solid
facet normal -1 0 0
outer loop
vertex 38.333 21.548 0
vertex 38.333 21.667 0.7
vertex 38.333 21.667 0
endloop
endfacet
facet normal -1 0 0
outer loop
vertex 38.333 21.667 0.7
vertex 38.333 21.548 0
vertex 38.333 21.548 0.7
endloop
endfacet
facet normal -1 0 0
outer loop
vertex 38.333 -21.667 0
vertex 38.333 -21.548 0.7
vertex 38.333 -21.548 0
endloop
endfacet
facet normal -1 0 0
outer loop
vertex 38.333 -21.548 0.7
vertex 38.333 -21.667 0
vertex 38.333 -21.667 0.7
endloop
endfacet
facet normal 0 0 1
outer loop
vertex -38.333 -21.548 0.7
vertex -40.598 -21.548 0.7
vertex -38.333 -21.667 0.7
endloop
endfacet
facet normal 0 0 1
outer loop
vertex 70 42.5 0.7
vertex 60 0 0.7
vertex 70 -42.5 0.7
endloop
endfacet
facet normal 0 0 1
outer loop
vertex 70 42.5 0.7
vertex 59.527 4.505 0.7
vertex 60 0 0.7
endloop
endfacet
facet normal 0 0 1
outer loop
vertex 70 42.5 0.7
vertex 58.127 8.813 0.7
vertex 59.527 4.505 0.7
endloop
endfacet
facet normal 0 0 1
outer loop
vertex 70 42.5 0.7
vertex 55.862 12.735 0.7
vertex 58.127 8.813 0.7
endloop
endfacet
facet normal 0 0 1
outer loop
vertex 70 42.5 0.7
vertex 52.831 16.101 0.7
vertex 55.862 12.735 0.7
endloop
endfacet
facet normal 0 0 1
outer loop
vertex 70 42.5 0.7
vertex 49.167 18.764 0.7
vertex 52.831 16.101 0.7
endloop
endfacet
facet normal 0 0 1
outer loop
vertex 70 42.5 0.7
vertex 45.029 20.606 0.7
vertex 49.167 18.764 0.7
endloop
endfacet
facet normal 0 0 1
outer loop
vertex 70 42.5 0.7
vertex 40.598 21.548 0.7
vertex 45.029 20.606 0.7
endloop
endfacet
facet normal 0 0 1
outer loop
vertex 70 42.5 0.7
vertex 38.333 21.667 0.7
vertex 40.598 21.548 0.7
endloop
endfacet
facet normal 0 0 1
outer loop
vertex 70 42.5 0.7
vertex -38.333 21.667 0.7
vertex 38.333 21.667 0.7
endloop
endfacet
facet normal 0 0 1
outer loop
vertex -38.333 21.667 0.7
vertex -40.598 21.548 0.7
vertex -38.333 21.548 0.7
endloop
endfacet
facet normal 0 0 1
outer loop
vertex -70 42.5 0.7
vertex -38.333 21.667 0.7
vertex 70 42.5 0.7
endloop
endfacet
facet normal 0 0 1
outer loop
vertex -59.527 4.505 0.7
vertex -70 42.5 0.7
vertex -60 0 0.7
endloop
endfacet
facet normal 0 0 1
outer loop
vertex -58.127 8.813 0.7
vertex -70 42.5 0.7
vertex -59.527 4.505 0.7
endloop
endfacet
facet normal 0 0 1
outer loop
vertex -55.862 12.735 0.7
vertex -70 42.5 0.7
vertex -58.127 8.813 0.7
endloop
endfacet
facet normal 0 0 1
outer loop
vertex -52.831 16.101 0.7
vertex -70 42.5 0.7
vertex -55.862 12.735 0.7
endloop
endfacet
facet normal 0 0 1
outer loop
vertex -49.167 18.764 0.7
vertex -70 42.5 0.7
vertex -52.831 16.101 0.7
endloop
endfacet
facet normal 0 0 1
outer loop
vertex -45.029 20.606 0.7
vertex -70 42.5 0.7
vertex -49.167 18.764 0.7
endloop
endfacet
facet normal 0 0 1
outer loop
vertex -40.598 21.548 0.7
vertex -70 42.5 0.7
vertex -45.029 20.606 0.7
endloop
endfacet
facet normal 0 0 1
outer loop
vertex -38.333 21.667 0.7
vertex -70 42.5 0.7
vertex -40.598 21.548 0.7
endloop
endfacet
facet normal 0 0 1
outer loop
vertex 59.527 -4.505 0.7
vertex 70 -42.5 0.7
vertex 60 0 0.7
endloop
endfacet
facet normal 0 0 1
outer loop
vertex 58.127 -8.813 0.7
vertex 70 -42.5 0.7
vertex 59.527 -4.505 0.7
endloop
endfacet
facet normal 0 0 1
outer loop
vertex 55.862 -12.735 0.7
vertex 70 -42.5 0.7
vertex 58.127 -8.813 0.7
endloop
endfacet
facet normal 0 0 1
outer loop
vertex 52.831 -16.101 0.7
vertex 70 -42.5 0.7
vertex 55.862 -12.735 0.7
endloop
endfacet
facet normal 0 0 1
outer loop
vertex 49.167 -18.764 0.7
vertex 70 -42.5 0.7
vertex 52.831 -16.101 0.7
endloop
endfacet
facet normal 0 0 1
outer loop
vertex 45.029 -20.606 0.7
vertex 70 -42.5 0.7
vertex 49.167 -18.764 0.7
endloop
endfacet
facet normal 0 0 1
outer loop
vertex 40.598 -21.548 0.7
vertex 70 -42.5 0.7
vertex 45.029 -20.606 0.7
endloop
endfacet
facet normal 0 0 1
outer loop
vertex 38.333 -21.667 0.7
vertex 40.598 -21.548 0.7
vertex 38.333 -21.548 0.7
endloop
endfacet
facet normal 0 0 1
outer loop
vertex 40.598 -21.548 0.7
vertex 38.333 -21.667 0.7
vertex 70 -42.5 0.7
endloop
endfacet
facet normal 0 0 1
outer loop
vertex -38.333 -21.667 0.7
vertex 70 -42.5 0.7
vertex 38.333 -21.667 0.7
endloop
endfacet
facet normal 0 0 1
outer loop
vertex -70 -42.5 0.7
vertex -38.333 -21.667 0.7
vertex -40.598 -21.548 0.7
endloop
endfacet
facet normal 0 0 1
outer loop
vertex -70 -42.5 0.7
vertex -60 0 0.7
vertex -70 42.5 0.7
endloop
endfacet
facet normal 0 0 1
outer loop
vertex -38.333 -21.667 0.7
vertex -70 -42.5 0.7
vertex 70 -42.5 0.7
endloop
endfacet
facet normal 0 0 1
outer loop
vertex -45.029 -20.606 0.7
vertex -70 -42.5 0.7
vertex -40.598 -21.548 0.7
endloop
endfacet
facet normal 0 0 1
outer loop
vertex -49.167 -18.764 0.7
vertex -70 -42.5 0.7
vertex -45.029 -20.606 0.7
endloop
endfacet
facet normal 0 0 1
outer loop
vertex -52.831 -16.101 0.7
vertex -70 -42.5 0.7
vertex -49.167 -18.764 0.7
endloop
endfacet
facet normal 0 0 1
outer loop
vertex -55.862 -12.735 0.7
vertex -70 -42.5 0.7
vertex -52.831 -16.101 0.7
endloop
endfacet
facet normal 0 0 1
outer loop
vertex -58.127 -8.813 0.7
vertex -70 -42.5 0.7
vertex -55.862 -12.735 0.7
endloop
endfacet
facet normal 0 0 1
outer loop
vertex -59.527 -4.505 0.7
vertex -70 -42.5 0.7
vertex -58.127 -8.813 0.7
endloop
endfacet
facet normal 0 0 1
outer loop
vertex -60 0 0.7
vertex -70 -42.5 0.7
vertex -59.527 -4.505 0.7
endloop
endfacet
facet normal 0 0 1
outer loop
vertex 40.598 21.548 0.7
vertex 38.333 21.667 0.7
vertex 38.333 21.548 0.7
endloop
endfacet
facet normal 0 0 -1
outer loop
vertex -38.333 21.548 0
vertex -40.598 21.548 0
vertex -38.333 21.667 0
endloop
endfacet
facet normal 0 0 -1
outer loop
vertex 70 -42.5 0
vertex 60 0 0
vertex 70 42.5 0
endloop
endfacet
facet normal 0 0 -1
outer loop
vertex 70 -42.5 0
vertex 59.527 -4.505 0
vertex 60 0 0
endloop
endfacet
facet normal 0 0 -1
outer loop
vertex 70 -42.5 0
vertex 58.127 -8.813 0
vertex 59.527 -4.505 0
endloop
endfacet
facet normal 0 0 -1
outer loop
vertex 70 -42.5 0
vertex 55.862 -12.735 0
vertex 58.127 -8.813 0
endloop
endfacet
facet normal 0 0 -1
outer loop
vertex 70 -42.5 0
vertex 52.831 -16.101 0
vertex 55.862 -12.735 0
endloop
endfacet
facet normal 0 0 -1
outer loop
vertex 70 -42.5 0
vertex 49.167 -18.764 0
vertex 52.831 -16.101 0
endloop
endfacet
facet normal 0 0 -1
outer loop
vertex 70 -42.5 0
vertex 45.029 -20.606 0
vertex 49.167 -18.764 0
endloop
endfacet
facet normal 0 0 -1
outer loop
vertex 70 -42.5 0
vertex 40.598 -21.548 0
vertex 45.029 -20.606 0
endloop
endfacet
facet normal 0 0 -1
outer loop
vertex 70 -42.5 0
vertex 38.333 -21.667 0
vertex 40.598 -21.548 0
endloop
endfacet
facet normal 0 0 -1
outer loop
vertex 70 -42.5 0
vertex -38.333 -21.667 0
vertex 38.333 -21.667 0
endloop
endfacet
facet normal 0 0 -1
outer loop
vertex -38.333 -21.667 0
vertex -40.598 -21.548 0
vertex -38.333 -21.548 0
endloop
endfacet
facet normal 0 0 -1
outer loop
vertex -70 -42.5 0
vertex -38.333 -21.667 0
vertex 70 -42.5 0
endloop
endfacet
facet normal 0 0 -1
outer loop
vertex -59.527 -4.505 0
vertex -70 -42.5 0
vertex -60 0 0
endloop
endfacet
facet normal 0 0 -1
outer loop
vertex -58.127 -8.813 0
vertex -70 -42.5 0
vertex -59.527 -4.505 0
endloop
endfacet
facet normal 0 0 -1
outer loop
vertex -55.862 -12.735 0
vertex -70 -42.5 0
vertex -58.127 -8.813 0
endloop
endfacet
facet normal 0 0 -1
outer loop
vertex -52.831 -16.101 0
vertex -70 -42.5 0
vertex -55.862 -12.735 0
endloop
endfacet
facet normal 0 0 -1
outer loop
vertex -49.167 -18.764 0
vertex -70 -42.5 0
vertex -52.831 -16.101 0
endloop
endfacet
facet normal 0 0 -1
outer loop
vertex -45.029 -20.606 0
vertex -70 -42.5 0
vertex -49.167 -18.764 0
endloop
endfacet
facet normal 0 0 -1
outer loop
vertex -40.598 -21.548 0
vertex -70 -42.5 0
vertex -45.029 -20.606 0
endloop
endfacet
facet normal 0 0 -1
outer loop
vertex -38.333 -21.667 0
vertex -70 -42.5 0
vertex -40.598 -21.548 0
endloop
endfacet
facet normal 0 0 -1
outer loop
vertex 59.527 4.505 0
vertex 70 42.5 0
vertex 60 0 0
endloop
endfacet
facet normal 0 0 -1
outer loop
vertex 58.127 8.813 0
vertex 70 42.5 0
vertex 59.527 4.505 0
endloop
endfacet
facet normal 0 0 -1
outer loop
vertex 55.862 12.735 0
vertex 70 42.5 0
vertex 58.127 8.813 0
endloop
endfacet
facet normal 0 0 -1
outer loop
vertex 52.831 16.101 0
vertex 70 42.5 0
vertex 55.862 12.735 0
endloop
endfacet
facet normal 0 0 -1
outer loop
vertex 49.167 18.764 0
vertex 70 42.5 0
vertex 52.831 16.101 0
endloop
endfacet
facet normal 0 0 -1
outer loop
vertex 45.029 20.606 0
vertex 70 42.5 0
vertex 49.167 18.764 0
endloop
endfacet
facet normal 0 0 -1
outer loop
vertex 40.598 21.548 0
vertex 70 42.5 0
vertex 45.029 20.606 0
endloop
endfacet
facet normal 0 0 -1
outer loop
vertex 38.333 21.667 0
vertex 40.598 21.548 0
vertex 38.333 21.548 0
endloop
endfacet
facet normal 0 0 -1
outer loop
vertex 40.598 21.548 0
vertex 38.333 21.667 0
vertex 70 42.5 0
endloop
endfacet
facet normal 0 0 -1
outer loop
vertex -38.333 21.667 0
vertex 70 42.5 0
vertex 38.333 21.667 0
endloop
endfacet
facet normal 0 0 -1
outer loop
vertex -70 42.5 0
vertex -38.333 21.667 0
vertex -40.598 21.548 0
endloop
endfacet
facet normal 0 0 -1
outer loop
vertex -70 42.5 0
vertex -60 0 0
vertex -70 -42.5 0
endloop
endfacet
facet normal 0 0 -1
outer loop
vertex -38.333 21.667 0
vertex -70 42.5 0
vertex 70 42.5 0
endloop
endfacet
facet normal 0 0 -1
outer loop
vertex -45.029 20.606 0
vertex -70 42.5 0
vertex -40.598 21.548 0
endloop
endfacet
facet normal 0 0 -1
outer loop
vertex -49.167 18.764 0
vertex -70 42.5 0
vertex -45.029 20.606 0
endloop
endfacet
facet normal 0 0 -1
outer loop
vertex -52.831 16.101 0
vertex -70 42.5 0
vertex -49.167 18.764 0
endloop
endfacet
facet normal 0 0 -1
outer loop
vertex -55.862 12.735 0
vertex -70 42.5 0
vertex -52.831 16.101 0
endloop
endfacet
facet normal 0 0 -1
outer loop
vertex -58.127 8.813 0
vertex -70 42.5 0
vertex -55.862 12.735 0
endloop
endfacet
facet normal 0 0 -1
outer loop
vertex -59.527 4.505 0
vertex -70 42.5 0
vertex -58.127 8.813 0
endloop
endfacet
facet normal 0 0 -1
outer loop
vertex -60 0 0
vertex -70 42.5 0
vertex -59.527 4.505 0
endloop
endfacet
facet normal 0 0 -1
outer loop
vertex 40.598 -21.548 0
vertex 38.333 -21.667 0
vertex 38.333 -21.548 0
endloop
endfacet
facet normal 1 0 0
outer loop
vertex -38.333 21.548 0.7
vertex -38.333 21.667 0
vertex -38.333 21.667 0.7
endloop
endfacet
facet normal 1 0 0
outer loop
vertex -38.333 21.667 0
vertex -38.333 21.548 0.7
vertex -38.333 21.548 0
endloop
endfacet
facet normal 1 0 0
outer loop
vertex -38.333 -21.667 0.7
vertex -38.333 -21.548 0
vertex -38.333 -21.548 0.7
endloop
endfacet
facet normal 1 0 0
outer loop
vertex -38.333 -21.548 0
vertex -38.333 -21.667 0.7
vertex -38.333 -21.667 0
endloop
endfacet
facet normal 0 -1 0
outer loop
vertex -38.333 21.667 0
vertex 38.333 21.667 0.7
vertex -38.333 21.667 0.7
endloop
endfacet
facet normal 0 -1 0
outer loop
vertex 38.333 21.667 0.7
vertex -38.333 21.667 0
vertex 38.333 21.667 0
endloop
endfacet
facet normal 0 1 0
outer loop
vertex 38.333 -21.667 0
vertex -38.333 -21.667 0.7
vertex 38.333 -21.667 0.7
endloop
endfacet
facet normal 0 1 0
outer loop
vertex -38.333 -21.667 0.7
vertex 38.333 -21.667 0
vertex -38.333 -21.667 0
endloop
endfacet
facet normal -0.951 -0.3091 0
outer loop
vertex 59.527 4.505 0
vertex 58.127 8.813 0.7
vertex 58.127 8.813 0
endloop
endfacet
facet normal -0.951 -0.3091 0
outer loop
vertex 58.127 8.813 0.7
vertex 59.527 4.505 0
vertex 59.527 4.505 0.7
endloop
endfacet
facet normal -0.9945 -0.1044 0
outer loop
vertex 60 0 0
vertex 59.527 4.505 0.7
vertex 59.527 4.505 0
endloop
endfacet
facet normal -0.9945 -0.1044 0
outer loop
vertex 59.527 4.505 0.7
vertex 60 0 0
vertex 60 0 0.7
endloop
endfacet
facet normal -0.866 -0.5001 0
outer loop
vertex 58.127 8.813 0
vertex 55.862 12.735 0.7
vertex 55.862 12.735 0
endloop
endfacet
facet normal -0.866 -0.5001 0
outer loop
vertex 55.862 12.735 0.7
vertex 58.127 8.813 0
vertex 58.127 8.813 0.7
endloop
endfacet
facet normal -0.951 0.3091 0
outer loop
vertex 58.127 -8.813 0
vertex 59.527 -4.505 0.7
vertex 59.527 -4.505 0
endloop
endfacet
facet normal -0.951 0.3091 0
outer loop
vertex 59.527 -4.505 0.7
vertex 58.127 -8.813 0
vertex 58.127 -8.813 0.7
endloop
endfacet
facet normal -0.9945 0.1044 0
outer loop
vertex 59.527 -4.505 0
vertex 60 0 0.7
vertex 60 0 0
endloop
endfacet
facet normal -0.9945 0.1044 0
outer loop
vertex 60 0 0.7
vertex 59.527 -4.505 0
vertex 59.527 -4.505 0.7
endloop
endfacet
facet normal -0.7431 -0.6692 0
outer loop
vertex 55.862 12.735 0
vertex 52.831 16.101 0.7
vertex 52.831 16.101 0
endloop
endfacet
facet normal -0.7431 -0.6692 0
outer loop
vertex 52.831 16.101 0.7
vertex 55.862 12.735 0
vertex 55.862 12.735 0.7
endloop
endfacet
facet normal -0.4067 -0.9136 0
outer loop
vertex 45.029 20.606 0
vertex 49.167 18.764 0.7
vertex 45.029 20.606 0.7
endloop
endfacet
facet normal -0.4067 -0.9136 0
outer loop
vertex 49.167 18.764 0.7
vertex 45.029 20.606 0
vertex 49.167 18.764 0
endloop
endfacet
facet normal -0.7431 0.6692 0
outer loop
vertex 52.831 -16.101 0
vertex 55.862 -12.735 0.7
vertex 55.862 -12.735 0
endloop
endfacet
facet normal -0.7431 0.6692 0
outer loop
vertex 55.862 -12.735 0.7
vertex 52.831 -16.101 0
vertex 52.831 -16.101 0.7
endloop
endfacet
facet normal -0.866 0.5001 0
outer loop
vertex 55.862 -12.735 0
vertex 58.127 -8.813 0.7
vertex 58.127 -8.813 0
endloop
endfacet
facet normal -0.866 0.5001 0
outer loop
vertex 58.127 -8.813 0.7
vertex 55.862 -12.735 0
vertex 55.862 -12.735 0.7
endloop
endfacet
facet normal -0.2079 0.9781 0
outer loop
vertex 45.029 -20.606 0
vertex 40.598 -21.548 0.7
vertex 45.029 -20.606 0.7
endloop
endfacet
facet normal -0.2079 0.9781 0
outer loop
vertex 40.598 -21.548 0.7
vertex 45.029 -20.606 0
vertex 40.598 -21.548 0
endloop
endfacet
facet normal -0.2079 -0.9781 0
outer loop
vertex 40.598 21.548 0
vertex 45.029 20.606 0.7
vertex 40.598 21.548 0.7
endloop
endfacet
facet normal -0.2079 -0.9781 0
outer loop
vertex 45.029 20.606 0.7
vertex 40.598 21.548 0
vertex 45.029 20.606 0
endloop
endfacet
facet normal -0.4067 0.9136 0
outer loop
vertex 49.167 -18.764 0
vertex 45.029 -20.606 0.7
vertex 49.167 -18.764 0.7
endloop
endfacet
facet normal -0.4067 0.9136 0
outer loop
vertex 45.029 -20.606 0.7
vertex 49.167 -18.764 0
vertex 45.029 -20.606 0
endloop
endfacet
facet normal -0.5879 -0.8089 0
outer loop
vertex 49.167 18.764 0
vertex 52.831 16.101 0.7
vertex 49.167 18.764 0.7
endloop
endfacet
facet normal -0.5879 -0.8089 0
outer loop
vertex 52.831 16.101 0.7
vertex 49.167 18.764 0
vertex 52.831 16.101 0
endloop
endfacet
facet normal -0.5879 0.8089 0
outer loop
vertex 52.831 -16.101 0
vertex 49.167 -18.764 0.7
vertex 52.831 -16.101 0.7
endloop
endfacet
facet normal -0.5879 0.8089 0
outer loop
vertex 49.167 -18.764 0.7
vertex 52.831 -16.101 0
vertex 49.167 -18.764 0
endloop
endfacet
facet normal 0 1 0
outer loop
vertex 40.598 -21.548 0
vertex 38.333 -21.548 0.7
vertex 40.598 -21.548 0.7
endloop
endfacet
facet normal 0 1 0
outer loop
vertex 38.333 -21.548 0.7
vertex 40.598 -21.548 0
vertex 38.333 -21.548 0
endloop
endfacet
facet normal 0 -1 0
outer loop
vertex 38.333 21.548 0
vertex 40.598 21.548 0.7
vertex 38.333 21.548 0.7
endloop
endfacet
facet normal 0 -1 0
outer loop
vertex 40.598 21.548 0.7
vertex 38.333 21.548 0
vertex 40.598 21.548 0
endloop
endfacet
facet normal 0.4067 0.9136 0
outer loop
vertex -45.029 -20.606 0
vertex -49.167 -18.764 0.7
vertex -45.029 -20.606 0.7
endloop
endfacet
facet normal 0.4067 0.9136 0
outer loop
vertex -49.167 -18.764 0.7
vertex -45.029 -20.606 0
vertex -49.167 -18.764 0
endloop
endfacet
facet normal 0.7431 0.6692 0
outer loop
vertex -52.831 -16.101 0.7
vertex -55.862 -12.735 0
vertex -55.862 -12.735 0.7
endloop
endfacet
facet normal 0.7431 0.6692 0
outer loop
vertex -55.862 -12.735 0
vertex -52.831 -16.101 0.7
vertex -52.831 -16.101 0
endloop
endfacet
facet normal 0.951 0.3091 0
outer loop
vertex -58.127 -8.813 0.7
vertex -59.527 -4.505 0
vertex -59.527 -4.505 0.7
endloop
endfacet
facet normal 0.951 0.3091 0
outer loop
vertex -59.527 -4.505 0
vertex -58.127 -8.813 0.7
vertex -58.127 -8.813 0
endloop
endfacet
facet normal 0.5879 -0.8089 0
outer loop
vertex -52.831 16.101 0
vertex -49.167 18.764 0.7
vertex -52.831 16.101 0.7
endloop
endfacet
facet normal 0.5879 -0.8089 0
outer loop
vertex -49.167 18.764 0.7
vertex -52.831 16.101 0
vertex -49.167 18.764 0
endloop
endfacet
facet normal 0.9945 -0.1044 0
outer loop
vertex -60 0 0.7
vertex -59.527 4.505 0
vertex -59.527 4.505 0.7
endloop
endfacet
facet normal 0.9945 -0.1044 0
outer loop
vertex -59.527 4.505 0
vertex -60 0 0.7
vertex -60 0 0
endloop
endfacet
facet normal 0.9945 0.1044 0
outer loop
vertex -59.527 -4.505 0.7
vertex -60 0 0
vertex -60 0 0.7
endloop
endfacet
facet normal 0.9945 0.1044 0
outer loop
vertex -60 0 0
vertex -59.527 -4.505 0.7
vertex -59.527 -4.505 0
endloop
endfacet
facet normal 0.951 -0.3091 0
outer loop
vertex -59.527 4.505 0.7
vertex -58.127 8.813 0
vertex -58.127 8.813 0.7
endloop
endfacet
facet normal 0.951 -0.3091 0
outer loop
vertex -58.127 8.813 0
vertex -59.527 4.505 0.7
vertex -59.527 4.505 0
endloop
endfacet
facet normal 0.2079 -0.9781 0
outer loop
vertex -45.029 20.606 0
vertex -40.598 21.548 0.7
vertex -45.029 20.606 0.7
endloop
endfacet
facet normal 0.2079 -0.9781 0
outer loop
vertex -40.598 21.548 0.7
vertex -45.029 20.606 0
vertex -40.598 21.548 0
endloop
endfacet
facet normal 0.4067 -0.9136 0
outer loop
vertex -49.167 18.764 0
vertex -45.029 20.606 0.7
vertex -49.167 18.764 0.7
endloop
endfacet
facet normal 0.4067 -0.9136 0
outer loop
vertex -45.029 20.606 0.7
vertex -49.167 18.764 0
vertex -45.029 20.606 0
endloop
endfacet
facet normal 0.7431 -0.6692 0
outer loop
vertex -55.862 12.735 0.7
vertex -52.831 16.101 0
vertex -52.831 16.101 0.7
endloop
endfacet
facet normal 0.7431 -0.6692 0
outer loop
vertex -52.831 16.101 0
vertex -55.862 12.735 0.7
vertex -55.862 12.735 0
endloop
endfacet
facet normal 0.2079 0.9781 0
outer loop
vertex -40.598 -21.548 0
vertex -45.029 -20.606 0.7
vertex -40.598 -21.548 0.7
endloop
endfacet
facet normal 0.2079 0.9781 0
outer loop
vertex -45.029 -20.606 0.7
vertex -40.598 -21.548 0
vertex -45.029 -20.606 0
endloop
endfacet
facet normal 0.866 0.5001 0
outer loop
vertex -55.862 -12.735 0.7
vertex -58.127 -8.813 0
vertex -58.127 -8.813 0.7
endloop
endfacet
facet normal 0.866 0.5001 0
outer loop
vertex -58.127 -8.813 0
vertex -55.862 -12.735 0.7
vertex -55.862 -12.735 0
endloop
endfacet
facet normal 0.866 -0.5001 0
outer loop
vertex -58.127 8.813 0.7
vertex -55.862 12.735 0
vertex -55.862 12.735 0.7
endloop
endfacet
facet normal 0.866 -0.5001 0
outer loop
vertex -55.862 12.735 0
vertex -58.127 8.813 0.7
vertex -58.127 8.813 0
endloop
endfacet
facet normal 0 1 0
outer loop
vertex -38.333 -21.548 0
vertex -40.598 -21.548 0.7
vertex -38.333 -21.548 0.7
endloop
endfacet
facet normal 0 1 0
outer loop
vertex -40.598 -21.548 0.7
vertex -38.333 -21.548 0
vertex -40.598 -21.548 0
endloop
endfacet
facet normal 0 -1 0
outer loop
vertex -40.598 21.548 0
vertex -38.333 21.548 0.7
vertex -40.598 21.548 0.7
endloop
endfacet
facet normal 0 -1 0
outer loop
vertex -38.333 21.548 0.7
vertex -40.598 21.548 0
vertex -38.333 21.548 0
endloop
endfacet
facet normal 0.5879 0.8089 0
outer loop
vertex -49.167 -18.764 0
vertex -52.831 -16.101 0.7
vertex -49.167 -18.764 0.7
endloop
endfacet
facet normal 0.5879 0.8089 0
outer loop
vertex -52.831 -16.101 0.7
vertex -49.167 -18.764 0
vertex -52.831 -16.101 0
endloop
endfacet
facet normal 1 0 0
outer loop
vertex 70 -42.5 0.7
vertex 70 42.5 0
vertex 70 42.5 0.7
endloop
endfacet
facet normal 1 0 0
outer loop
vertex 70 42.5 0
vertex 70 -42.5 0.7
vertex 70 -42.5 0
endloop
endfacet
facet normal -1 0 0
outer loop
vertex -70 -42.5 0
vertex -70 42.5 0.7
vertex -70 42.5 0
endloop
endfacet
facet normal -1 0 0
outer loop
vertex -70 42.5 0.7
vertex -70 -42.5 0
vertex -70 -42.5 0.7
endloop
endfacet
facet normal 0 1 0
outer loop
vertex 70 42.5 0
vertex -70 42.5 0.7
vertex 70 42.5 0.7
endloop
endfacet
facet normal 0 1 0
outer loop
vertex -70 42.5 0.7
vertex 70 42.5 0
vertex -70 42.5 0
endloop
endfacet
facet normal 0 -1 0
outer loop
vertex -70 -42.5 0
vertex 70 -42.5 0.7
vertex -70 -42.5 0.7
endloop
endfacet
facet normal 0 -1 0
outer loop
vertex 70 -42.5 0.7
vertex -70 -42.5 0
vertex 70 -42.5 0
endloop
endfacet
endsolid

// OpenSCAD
outerlength=140;
outerwidth=85;

length=120;
width=65;
thick=.7;
scallop=10;
radius=width/3;

module ex(points)
{
  linear_extrude(height=thick, convexity=10)
    polygon(points);
}
module corner(thickness)
{
  translate([0,width/2-15,0])
  linear_extrude(height=thickness, convexity=10)
  import("profile.dxf",layer="Layer_1");
}

module profile()
{
  corner(thick);
  mirror([1,0,0]) corner(thick);
}
module base()
{
  translate([-(length/2-radius),-radius,0]) cube([length-2*radius,radius*2,thick]);
  translate([length/2-radius,0,0]) cylinder(r=radius,h=thick);
  translate([-(length/2-radius),0,0]) cylinder(r=radius,h=thick);

  profile();
  mirror([0,1,0]) profile();
}
module labelshape()
{
  difference()
  {
    base();
    translate([length/4,width,0]) cylinder(r=scallop,h=thick);
  }
}

difference()
{
  translate([-(outerlength/2),-outerwidth/2,0]) cube([outerlength,outerwidth,thick]);
  labelshape();
}
